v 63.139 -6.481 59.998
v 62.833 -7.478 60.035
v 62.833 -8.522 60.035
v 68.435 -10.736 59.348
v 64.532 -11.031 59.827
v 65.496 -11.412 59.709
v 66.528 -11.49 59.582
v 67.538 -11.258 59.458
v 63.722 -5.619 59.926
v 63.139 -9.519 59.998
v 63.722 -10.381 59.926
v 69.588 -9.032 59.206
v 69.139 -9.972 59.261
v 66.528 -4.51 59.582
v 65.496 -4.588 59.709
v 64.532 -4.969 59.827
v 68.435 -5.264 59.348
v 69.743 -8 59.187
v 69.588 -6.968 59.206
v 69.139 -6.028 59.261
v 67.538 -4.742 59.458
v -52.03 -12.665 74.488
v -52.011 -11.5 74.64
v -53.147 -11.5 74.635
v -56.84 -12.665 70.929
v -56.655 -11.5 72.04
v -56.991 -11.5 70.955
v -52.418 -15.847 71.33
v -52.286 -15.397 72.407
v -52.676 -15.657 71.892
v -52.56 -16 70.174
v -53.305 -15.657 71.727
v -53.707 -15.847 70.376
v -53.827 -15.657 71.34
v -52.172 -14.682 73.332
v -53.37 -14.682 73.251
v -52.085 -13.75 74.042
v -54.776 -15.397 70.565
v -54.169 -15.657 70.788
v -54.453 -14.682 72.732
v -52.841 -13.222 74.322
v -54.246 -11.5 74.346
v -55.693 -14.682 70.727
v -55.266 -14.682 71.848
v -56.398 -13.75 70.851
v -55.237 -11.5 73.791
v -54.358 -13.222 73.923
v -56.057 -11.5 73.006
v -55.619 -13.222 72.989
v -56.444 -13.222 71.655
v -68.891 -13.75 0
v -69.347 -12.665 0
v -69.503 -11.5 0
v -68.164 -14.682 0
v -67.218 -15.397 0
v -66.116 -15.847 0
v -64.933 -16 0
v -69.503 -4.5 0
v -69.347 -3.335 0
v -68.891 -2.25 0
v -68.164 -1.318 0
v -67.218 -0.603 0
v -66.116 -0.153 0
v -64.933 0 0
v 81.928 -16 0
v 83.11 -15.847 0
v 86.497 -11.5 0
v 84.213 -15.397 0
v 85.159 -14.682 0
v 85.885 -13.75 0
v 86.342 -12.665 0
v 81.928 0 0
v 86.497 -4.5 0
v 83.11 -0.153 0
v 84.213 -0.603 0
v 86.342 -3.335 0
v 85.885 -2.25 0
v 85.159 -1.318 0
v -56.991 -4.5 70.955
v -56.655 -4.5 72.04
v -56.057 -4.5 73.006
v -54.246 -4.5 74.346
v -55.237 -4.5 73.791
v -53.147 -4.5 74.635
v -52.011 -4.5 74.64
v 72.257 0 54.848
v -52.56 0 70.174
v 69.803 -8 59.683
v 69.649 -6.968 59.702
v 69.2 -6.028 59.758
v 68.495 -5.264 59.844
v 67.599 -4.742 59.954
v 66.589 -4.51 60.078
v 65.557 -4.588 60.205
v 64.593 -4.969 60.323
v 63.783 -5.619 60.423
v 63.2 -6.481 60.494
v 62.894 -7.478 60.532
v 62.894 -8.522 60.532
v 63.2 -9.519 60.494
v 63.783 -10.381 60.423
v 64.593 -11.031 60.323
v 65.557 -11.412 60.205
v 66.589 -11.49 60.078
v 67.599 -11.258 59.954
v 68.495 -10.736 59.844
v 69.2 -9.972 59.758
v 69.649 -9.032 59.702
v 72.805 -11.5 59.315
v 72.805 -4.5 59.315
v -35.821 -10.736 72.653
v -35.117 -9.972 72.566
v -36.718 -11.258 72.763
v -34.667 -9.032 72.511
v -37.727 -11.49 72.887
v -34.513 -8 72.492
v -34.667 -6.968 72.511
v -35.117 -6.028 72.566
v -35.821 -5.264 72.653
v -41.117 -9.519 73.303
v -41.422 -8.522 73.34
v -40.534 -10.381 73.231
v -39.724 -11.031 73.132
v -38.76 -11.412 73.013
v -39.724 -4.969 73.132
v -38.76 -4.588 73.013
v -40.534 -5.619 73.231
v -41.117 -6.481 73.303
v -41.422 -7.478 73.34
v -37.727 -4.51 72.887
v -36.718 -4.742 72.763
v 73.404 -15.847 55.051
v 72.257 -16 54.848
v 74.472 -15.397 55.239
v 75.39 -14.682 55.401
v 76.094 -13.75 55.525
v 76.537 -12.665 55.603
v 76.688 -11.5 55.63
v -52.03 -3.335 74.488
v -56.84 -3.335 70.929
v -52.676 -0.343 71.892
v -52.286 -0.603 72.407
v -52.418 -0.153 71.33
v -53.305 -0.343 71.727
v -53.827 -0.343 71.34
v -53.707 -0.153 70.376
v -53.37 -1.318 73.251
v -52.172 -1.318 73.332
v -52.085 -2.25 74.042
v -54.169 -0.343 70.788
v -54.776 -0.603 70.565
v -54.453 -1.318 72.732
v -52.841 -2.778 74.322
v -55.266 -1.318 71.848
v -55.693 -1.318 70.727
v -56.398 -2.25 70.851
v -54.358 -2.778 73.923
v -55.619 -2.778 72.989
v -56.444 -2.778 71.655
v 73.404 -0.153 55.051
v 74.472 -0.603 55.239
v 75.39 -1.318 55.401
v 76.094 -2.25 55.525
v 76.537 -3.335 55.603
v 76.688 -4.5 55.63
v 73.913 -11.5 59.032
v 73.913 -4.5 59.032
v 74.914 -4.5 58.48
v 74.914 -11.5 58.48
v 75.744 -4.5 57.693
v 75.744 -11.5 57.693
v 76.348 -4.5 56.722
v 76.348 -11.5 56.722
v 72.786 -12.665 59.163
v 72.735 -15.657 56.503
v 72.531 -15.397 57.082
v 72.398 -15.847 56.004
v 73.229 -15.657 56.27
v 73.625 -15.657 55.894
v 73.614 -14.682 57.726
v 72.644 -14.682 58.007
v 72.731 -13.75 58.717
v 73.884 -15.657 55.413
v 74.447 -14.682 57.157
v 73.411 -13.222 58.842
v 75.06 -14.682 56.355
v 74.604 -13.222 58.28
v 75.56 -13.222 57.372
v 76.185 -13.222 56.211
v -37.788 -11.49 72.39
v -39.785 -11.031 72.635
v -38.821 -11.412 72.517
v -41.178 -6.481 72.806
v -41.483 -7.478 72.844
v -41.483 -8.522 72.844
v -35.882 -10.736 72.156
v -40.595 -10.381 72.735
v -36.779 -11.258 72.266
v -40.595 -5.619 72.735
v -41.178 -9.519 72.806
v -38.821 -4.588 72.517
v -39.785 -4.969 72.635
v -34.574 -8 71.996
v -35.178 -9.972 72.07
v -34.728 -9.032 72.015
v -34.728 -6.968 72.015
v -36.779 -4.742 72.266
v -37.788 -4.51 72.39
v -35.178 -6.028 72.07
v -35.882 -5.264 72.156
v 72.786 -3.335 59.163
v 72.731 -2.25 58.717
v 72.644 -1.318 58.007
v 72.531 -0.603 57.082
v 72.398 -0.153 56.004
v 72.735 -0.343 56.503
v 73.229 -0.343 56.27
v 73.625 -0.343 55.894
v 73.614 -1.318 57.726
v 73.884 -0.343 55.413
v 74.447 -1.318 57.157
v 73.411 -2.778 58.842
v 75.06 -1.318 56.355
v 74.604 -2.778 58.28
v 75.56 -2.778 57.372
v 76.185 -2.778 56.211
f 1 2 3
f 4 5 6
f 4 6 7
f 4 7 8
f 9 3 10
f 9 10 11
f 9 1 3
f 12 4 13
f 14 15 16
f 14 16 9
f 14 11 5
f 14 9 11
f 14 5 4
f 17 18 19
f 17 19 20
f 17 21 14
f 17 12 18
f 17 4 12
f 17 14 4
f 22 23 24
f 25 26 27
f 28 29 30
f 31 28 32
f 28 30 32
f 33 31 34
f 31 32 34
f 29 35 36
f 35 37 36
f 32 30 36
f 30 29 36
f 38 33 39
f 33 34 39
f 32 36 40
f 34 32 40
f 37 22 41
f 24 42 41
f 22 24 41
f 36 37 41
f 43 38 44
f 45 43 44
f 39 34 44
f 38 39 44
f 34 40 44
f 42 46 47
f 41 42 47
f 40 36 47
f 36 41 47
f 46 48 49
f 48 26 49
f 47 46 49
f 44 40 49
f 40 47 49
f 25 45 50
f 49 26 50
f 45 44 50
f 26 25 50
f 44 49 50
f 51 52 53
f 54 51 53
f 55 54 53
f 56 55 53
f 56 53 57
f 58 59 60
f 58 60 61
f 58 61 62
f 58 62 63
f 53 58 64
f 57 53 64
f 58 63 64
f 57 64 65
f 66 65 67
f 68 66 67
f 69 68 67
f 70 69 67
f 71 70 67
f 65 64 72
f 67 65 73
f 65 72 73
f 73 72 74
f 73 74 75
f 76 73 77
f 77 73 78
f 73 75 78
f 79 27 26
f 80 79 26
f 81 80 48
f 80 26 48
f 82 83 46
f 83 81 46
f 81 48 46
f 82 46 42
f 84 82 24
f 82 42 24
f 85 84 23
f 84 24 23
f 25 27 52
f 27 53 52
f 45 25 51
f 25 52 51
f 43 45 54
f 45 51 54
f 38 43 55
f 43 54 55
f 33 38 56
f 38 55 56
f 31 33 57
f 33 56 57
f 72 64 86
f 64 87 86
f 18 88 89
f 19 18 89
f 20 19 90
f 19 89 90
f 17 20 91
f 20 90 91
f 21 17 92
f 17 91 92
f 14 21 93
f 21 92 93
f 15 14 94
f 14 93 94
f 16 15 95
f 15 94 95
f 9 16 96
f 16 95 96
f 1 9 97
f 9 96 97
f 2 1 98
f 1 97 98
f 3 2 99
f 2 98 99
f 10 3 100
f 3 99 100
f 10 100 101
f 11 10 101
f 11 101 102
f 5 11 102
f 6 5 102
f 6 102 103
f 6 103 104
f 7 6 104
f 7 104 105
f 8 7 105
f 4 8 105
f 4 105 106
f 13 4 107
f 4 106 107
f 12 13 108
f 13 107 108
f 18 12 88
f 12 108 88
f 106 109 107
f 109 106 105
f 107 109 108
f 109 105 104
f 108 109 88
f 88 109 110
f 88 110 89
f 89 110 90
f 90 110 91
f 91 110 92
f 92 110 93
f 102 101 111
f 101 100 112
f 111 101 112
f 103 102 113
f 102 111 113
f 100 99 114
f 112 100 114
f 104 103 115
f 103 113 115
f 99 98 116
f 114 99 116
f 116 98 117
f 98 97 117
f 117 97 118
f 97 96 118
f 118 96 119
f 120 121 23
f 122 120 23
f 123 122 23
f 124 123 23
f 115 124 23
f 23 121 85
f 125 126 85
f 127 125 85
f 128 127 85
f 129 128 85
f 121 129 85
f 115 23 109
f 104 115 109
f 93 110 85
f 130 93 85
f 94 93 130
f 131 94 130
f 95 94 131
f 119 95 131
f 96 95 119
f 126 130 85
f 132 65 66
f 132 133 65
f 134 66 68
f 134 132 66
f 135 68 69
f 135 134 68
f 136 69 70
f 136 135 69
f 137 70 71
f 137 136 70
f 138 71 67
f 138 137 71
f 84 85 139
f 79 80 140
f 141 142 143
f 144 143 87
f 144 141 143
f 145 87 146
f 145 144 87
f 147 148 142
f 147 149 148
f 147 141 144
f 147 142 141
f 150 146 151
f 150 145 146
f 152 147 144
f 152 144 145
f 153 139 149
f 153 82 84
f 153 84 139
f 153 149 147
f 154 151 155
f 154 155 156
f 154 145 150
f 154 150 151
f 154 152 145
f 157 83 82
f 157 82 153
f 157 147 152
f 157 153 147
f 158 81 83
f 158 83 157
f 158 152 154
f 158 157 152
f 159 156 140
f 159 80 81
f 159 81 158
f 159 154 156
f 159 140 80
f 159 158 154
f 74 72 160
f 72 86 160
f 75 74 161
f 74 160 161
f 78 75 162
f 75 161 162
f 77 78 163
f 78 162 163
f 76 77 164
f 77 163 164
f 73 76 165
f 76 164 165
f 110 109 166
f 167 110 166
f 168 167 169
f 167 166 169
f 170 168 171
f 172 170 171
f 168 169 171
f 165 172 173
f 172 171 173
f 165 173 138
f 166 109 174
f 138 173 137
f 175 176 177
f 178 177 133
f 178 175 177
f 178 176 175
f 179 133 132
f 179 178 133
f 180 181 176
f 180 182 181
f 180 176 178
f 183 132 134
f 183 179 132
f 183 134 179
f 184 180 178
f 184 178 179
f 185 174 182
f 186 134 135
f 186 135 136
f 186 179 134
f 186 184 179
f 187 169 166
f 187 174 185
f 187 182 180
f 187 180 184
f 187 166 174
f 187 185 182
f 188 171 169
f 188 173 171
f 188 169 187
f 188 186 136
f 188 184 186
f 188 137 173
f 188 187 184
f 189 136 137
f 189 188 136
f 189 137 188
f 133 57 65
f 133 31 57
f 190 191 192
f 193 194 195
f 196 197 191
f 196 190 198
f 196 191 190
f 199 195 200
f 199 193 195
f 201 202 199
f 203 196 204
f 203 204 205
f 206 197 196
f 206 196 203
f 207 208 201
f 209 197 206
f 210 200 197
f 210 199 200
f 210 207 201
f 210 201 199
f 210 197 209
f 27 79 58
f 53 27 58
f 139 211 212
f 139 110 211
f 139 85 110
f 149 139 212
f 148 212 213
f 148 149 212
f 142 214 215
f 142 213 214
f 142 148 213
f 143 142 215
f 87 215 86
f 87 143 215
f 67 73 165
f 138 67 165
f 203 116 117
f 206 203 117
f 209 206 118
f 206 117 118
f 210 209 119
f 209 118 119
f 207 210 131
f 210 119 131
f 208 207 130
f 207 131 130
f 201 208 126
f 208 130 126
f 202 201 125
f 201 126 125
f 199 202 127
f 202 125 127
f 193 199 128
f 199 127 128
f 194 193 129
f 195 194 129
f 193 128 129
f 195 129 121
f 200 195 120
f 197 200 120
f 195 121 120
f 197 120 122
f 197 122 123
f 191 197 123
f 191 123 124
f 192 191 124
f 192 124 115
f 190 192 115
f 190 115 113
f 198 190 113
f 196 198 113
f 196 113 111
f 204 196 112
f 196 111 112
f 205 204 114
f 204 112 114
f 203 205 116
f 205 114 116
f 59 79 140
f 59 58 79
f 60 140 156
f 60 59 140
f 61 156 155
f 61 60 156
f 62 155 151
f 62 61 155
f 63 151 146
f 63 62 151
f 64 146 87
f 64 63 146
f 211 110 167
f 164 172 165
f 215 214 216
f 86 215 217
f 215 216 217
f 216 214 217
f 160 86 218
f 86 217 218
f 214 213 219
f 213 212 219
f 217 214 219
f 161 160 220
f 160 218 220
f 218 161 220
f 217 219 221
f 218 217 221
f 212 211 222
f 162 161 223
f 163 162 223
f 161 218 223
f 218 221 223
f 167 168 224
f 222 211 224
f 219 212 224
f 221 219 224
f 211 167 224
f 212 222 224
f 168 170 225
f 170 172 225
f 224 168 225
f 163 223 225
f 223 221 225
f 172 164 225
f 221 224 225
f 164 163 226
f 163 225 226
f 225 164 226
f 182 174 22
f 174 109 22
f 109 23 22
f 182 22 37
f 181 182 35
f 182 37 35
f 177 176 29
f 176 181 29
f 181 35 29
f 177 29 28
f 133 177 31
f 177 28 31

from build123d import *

# Parameters (mm, degrees)
F1_DEPTH = 16
F2_R     = 3.5
F3_DEPTH = 0.5
F4_R     = 4.49999


# Not quite as in the source:
# - a fillet or chamfer is up to 0.001 mm smaller than in the source, because OpenCascade refuses the exact size


with BuildPart() as f1:
    # F0 (on Front) → F1 (new body)
    with BuildSketch(Plane.XZ):
        Polygon((-56.24990897, 75.1608516625), (-69.5027950111, 0), (86.4972049889, 0), (76.1099402454, 58.9091056954), align=None)
    extrude(amount=F1_DEPTH)

    # F2 (on face) → F3 (cut)
    with BuildSketch(Plane(origin=(8.256096508, 0, 67.2405101043), x_dir=(0.9925461516, 0, -0.1218693434), z_dir=(0.1218693434, 0, 0.9925461516))):
        with Locations((-46.5904343202, -8)):
            Circle(F2_R)
        with Locations((58.5095656798, -8)):
            Circle(F2_R)
    extrude(amount=-F3_DEPTH, mode=Mode.SUBTRACT)

    # F4 (radius 4.5 in the source; OpenCascade refuses exactly that, so slightly less here)
    f4_edges = [f1.edges().sort_by_distance(p)[0] for p in [
        (9.930016, -16, 67.034979),
        (9.930016, 0, 67.034979),
        (81.303573, 0, 29.454553),
        (81.303573, -16, 29.454553),
        (-62.876352, -16, 37.580426),
        (-62.876352, 0, 37.580426),
        (-56.249909, -8, 75.160852),
        (76.10994, -8, 58.909106),
    ]]
    fillet(f4_edges, radius=F4_R)


solid = f1.part
